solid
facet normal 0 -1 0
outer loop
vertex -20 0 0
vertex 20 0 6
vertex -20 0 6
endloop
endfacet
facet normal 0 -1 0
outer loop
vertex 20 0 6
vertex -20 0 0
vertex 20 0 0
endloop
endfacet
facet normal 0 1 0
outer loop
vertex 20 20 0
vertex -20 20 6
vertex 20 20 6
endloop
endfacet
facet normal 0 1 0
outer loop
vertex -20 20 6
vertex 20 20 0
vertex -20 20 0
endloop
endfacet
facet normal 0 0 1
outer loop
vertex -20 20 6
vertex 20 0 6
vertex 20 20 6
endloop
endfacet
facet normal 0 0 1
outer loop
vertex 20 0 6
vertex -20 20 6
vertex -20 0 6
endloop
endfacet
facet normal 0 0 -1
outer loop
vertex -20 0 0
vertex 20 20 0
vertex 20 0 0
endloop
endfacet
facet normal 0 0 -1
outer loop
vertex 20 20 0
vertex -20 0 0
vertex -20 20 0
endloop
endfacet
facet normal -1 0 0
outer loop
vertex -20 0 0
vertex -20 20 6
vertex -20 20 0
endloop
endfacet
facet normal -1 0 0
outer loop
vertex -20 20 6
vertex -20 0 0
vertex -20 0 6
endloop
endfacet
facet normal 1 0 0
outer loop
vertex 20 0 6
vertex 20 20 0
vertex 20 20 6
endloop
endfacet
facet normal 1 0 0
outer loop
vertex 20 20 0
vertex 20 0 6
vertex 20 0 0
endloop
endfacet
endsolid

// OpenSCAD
// Parametric mirrored hinge for the fiber splice box.
// Dimensions are in millimeters.

$fn = 72;

leaf_size = 20;          // Each hinge leaf is 20 mm x 20 mm.
leaf_thickness = 6;      // Leaf and barrel outside diameter are 6 mm thick.
barrel_diameter = 6;
pin_diameter = 2.4;
barrel_gap = 1;

module leaf(side = -1) {
    // side -1 = left leaf, side 1 = mirrored right leaf.
    x0 = side < 0 ? -leaf_size : 0;

    translate([x0, 0, 0])
        cube([leaf_size, leaf_size, leaf_thickness], center = false);
}

module barrel_segment(y_start, y_len) {
    // Barrel axis follows the 20 mm edge of each leaf.
    translate([0, y_start, leaf_thickness / 2])
        rotate([-90, 0, 0])
            difference() {
                cylinder(h = y_len, d = barrel_diameter);
                translate([0, 0, -0.1])
                    cylinder(h = y_len + 0.2, d = pin_diameter);
            }
}

module left_leaf_with_barrels() {
    leaf(-1);

    // Outer knuckles on the described side.
    barrel_segment(0, 7 - barrel_gap / 2);
    barrel_segment(13 + barrel_gap / 2, 7 - barrel_gap / 2);
}

module right_leaf_with_barrels() {
    mirror([1, 0, 0])
        leaf(-1);

    // Mirrored side with the barrel shifted into the open center gap.
    barrel_segment(7 + barrel_gap / 2, 6 - barrel_gap);
}

module hinge() {
    left_leaf_with_barrels();
    right_leaf_with_barrels();
}

hinge();
